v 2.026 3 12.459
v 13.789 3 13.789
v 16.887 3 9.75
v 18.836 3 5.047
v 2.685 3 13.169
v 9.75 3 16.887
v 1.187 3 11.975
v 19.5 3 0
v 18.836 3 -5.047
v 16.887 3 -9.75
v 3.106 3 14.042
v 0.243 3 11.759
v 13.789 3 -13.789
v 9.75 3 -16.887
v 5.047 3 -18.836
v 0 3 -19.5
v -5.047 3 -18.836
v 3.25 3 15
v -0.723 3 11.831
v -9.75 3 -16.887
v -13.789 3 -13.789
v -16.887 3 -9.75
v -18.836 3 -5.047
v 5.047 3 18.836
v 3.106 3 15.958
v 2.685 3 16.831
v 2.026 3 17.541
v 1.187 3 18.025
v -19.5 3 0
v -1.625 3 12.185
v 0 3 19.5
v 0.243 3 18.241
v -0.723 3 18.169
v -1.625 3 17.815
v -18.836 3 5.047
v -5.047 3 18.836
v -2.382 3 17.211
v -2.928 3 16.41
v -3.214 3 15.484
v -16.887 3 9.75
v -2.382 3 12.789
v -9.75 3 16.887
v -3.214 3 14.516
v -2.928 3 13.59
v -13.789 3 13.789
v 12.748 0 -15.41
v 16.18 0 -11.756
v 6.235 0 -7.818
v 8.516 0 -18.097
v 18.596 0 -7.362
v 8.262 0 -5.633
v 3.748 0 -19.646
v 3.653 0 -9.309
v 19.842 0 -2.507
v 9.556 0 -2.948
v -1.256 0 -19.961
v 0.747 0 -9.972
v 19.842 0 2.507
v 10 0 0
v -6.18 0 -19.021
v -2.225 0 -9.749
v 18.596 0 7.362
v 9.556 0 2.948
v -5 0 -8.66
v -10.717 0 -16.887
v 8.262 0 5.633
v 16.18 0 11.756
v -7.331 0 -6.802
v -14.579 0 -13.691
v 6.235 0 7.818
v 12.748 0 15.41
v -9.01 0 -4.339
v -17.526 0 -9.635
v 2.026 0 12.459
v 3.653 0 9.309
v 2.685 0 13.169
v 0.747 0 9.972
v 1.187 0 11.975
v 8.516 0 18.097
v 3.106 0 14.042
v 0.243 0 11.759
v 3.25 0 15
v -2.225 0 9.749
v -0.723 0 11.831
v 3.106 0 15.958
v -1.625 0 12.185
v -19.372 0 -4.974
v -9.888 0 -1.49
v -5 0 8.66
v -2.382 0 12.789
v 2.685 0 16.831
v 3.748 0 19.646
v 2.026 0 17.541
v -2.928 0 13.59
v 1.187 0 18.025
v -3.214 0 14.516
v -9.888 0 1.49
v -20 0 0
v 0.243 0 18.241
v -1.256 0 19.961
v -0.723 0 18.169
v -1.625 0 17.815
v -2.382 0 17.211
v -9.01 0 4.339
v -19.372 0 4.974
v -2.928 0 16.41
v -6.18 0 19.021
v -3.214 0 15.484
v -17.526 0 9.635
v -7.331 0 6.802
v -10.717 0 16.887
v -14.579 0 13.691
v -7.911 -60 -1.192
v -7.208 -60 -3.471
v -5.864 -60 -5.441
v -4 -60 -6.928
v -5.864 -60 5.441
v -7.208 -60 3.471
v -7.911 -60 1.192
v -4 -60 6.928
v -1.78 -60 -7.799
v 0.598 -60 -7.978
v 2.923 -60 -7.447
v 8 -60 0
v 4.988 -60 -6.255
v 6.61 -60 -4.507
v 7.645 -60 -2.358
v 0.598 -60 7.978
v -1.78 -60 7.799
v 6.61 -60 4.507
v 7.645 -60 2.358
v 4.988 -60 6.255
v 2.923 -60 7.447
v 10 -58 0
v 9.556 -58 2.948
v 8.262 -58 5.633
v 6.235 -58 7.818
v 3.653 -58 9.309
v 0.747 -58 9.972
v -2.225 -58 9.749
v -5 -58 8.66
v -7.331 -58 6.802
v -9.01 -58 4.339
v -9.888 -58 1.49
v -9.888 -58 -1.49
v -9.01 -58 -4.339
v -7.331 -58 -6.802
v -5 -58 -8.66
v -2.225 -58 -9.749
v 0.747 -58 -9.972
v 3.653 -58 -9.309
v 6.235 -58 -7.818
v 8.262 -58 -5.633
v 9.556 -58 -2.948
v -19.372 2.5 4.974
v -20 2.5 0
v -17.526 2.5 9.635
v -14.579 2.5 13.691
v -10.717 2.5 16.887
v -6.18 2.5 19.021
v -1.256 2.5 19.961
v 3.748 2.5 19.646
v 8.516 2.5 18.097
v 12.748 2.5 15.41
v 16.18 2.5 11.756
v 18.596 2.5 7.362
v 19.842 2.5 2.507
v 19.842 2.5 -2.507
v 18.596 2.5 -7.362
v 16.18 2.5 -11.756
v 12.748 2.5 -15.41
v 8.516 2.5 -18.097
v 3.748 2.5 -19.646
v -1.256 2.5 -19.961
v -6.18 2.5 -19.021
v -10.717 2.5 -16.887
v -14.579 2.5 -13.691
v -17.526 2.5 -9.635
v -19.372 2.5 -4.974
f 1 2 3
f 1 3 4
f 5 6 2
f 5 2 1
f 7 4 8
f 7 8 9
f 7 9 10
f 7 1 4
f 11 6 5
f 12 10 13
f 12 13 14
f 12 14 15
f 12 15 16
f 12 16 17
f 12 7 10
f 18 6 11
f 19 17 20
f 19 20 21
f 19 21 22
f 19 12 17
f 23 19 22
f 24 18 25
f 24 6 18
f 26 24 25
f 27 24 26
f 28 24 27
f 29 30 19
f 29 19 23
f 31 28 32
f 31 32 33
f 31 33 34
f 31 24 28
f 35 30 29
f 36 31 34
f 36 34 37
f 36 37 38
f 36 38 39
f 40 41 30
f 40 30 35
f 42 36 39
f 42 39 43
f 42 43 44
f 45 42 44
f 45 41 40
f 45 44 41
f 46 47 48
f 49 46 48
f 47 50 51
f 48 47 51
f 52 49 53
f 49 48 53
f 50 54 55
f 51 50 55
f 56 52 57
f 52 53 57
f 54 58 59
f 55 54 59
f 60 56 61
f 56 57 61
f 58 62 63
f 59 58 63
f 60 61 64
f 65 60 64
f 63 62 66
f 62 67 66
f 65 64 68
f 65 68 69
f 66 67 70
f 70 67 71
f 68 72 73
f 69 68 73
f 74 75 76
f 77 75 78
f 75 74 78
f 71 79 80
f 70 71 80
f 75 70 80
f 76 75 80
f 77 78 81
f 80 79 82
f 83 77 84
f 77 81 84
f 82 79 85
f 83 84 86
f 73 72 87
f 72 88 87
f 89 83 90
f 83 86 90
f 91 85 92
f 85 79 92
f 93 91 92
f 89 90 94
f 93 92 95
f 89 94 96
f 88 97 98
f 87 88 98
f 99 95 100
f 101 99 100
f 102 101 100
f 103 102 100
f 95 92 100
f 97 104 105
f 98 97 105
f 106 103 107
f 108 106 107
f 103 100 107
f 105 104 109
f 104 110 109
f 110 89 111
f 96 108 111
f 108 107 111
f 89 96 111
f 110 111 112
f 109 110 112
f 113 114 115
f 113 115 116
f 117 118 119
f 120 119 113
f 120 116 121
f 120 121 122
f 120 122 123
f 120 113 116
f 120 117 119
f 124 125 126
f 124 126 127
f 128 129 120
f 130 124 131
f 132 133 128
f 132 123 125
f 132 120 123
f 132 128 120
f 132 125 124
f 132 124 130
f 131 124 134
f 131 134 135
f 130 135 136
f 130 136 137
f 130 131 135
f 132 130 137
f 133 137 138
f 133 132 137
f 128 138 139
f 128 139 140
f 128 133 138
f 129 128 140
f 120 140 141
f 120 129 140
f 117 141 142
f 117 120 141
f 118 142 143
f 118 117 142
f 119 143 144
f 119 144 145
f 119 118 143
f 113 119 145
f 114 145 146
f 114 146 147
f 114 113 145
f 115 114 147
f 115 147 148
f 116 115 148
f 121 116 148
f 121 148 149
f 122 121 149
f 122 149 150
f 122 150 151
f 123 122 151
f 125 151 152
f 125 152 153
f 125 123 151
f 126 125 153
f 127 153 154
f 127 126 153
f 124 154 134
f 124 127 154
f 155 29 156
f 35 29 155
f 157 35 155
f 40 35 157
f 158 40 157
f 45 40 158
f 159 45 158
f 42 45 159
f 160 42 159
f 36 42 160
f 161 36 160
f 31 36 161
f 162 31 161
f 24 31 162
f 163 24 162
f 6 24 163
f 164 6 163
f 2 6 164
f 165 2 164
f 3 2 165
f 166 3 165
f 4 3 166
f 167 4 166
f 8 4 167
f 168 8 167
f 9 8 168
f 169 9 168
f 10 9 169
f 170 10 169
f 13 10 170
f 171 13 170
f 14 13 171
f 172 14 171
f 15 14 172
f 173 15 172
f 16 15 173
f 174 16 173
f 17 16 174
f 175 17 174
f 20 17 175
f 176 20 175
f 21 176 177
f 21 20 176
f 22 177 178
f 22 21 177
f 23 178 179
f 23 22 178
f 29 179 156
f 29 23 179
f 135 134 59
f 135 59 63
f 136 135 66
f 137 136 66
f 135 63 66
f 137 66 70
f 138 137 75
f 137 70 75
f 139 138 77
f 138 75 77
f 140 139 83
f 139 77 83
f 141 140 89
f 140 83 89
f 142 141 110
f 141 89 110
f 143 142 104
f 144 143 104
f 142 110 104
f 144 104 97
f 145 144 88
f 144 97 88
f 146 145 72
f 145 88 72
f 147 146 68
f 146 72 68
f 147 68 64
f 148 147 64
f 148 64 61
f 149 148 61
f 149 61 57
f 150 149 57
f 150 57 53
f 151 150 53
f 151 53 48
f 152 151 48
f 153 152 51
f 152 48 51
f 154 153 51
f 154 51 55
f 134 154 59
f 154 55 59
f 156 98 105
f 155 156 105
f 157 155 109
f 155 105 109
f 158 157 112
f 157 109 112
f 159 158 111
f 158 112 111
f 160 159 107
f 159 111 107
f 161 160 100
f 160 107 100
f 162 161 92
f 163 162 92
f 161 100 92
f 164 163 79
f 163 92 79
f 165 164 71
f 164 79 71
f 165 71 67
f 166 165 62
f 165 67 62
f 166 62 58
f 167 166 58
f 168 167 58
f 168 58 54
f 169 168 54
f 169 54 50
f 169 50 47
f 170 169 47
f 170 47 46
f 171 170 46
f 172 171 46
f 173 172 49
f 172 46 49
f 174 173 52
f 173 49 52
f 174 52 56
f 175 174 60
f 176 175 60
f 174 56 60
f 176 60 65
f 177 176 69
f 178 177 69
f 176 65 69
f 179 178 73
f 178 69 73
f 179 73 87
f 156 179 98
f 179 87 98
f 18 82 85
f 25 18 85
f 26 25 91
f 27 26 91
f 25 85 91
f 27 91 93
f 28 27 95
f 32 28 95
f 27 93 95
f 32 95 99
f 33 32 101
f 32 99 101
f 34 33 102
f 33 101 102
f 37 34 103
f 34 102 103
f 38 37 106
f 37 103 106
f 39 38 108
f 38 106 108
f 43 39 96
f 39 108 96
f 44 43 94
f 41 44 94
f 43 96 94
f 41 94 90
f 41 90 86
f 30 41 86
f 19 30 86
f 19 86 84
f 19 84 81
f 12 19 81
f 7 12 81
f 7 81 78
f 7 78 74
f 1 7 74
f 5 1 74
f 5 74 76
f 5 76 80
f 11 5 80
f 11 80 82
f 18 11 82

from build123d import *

# Parameters (mm, degrees)
F0_R     = 10
F1_DEPTH = 60
F2_R     = 20
F2_R_2   = 10
F3_DEPTH = 3
F4_SIZE  = 2
F6_D     = 6.5
F7_SIZE  = 0.5


with BuildPart() as f1:
    # F0 (on Front) → F1 (new body)
    with BuildSketch(Plane.XZ):
        Circle(F0_R)
    extrude(amount=F1_DEPTH)

    # F2 (on face) → F3 (join)
    with BuildSketch(Plane(origin=(0, 0, 0), x_dir=(-1, 0, 0), z_dir=(0, 1, 0))):
        Circle(F2_R)
        Circle(F2_R_2, mode=Mode.SUBTRACT)
        Circle(F2_R_2)
    extrude(amount=F3_DEPTH)

    # F4
    f4_edges = [f1.edges().sort_by_distance(p)[0] for p in [
        (-10, -60, 0),
    ]]
    chamfer(f4_edges, length=F4_SIZE)

    # F6 (through all)
    with Locations(Plane(origin=(0, 3, 0), x_dir=(-1, 0, 0), z_dir=(0, 1, 0))):
        with Locations((0, 15)):
            Hole(F6_D / 2)

    # F7
    f7_edges = [f1.edges().sort_by_distance(p)[0] for p in [
        (20, 3, 0),
    ]]
    chamfer(f7_edges, length=F7_SIZE)


solid = f1.part
